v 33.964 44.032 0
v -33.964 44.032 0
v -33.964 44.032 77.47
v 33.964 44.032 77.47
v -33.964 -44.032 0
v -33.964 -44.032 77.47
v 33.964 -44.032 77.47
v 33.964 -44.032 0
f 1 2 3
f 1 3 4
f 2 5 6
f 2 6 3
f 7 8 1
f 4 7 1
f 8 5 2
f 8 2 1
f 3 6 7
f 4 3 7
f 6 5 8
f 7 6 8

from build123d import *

# Parameters (mm, degrees)
F0_W     = 67.9279565811
F0_H     = 88.0647003651
F1_DEPTH = 45.212
F2_DEPTH = 32.258
F3_DEPTH = 25.4


with BuildPart() as f1:
    # F0 (on Top) → F1 (new body)
    with BuildSketch(Plane.XY):
        Rectangle(F0_W, F0_H)
    extrude(amount=F1_DEPTH)

    # F2 (add): a face of the model
    f2_faces = [f1.faces().sort_by_distance(p)[0] for p in [
        (0, 0, 45.212),
    ]]
    extrude(f2_faces, amount=F2_DEPTH)

    # F0 (on Top) → F3 (join)
    with BuildSketch(Plane.XY):
        Rectangle(F0_W, F0_H)
    extrude(amount=F3_DEPTH)


solid = f1.part
